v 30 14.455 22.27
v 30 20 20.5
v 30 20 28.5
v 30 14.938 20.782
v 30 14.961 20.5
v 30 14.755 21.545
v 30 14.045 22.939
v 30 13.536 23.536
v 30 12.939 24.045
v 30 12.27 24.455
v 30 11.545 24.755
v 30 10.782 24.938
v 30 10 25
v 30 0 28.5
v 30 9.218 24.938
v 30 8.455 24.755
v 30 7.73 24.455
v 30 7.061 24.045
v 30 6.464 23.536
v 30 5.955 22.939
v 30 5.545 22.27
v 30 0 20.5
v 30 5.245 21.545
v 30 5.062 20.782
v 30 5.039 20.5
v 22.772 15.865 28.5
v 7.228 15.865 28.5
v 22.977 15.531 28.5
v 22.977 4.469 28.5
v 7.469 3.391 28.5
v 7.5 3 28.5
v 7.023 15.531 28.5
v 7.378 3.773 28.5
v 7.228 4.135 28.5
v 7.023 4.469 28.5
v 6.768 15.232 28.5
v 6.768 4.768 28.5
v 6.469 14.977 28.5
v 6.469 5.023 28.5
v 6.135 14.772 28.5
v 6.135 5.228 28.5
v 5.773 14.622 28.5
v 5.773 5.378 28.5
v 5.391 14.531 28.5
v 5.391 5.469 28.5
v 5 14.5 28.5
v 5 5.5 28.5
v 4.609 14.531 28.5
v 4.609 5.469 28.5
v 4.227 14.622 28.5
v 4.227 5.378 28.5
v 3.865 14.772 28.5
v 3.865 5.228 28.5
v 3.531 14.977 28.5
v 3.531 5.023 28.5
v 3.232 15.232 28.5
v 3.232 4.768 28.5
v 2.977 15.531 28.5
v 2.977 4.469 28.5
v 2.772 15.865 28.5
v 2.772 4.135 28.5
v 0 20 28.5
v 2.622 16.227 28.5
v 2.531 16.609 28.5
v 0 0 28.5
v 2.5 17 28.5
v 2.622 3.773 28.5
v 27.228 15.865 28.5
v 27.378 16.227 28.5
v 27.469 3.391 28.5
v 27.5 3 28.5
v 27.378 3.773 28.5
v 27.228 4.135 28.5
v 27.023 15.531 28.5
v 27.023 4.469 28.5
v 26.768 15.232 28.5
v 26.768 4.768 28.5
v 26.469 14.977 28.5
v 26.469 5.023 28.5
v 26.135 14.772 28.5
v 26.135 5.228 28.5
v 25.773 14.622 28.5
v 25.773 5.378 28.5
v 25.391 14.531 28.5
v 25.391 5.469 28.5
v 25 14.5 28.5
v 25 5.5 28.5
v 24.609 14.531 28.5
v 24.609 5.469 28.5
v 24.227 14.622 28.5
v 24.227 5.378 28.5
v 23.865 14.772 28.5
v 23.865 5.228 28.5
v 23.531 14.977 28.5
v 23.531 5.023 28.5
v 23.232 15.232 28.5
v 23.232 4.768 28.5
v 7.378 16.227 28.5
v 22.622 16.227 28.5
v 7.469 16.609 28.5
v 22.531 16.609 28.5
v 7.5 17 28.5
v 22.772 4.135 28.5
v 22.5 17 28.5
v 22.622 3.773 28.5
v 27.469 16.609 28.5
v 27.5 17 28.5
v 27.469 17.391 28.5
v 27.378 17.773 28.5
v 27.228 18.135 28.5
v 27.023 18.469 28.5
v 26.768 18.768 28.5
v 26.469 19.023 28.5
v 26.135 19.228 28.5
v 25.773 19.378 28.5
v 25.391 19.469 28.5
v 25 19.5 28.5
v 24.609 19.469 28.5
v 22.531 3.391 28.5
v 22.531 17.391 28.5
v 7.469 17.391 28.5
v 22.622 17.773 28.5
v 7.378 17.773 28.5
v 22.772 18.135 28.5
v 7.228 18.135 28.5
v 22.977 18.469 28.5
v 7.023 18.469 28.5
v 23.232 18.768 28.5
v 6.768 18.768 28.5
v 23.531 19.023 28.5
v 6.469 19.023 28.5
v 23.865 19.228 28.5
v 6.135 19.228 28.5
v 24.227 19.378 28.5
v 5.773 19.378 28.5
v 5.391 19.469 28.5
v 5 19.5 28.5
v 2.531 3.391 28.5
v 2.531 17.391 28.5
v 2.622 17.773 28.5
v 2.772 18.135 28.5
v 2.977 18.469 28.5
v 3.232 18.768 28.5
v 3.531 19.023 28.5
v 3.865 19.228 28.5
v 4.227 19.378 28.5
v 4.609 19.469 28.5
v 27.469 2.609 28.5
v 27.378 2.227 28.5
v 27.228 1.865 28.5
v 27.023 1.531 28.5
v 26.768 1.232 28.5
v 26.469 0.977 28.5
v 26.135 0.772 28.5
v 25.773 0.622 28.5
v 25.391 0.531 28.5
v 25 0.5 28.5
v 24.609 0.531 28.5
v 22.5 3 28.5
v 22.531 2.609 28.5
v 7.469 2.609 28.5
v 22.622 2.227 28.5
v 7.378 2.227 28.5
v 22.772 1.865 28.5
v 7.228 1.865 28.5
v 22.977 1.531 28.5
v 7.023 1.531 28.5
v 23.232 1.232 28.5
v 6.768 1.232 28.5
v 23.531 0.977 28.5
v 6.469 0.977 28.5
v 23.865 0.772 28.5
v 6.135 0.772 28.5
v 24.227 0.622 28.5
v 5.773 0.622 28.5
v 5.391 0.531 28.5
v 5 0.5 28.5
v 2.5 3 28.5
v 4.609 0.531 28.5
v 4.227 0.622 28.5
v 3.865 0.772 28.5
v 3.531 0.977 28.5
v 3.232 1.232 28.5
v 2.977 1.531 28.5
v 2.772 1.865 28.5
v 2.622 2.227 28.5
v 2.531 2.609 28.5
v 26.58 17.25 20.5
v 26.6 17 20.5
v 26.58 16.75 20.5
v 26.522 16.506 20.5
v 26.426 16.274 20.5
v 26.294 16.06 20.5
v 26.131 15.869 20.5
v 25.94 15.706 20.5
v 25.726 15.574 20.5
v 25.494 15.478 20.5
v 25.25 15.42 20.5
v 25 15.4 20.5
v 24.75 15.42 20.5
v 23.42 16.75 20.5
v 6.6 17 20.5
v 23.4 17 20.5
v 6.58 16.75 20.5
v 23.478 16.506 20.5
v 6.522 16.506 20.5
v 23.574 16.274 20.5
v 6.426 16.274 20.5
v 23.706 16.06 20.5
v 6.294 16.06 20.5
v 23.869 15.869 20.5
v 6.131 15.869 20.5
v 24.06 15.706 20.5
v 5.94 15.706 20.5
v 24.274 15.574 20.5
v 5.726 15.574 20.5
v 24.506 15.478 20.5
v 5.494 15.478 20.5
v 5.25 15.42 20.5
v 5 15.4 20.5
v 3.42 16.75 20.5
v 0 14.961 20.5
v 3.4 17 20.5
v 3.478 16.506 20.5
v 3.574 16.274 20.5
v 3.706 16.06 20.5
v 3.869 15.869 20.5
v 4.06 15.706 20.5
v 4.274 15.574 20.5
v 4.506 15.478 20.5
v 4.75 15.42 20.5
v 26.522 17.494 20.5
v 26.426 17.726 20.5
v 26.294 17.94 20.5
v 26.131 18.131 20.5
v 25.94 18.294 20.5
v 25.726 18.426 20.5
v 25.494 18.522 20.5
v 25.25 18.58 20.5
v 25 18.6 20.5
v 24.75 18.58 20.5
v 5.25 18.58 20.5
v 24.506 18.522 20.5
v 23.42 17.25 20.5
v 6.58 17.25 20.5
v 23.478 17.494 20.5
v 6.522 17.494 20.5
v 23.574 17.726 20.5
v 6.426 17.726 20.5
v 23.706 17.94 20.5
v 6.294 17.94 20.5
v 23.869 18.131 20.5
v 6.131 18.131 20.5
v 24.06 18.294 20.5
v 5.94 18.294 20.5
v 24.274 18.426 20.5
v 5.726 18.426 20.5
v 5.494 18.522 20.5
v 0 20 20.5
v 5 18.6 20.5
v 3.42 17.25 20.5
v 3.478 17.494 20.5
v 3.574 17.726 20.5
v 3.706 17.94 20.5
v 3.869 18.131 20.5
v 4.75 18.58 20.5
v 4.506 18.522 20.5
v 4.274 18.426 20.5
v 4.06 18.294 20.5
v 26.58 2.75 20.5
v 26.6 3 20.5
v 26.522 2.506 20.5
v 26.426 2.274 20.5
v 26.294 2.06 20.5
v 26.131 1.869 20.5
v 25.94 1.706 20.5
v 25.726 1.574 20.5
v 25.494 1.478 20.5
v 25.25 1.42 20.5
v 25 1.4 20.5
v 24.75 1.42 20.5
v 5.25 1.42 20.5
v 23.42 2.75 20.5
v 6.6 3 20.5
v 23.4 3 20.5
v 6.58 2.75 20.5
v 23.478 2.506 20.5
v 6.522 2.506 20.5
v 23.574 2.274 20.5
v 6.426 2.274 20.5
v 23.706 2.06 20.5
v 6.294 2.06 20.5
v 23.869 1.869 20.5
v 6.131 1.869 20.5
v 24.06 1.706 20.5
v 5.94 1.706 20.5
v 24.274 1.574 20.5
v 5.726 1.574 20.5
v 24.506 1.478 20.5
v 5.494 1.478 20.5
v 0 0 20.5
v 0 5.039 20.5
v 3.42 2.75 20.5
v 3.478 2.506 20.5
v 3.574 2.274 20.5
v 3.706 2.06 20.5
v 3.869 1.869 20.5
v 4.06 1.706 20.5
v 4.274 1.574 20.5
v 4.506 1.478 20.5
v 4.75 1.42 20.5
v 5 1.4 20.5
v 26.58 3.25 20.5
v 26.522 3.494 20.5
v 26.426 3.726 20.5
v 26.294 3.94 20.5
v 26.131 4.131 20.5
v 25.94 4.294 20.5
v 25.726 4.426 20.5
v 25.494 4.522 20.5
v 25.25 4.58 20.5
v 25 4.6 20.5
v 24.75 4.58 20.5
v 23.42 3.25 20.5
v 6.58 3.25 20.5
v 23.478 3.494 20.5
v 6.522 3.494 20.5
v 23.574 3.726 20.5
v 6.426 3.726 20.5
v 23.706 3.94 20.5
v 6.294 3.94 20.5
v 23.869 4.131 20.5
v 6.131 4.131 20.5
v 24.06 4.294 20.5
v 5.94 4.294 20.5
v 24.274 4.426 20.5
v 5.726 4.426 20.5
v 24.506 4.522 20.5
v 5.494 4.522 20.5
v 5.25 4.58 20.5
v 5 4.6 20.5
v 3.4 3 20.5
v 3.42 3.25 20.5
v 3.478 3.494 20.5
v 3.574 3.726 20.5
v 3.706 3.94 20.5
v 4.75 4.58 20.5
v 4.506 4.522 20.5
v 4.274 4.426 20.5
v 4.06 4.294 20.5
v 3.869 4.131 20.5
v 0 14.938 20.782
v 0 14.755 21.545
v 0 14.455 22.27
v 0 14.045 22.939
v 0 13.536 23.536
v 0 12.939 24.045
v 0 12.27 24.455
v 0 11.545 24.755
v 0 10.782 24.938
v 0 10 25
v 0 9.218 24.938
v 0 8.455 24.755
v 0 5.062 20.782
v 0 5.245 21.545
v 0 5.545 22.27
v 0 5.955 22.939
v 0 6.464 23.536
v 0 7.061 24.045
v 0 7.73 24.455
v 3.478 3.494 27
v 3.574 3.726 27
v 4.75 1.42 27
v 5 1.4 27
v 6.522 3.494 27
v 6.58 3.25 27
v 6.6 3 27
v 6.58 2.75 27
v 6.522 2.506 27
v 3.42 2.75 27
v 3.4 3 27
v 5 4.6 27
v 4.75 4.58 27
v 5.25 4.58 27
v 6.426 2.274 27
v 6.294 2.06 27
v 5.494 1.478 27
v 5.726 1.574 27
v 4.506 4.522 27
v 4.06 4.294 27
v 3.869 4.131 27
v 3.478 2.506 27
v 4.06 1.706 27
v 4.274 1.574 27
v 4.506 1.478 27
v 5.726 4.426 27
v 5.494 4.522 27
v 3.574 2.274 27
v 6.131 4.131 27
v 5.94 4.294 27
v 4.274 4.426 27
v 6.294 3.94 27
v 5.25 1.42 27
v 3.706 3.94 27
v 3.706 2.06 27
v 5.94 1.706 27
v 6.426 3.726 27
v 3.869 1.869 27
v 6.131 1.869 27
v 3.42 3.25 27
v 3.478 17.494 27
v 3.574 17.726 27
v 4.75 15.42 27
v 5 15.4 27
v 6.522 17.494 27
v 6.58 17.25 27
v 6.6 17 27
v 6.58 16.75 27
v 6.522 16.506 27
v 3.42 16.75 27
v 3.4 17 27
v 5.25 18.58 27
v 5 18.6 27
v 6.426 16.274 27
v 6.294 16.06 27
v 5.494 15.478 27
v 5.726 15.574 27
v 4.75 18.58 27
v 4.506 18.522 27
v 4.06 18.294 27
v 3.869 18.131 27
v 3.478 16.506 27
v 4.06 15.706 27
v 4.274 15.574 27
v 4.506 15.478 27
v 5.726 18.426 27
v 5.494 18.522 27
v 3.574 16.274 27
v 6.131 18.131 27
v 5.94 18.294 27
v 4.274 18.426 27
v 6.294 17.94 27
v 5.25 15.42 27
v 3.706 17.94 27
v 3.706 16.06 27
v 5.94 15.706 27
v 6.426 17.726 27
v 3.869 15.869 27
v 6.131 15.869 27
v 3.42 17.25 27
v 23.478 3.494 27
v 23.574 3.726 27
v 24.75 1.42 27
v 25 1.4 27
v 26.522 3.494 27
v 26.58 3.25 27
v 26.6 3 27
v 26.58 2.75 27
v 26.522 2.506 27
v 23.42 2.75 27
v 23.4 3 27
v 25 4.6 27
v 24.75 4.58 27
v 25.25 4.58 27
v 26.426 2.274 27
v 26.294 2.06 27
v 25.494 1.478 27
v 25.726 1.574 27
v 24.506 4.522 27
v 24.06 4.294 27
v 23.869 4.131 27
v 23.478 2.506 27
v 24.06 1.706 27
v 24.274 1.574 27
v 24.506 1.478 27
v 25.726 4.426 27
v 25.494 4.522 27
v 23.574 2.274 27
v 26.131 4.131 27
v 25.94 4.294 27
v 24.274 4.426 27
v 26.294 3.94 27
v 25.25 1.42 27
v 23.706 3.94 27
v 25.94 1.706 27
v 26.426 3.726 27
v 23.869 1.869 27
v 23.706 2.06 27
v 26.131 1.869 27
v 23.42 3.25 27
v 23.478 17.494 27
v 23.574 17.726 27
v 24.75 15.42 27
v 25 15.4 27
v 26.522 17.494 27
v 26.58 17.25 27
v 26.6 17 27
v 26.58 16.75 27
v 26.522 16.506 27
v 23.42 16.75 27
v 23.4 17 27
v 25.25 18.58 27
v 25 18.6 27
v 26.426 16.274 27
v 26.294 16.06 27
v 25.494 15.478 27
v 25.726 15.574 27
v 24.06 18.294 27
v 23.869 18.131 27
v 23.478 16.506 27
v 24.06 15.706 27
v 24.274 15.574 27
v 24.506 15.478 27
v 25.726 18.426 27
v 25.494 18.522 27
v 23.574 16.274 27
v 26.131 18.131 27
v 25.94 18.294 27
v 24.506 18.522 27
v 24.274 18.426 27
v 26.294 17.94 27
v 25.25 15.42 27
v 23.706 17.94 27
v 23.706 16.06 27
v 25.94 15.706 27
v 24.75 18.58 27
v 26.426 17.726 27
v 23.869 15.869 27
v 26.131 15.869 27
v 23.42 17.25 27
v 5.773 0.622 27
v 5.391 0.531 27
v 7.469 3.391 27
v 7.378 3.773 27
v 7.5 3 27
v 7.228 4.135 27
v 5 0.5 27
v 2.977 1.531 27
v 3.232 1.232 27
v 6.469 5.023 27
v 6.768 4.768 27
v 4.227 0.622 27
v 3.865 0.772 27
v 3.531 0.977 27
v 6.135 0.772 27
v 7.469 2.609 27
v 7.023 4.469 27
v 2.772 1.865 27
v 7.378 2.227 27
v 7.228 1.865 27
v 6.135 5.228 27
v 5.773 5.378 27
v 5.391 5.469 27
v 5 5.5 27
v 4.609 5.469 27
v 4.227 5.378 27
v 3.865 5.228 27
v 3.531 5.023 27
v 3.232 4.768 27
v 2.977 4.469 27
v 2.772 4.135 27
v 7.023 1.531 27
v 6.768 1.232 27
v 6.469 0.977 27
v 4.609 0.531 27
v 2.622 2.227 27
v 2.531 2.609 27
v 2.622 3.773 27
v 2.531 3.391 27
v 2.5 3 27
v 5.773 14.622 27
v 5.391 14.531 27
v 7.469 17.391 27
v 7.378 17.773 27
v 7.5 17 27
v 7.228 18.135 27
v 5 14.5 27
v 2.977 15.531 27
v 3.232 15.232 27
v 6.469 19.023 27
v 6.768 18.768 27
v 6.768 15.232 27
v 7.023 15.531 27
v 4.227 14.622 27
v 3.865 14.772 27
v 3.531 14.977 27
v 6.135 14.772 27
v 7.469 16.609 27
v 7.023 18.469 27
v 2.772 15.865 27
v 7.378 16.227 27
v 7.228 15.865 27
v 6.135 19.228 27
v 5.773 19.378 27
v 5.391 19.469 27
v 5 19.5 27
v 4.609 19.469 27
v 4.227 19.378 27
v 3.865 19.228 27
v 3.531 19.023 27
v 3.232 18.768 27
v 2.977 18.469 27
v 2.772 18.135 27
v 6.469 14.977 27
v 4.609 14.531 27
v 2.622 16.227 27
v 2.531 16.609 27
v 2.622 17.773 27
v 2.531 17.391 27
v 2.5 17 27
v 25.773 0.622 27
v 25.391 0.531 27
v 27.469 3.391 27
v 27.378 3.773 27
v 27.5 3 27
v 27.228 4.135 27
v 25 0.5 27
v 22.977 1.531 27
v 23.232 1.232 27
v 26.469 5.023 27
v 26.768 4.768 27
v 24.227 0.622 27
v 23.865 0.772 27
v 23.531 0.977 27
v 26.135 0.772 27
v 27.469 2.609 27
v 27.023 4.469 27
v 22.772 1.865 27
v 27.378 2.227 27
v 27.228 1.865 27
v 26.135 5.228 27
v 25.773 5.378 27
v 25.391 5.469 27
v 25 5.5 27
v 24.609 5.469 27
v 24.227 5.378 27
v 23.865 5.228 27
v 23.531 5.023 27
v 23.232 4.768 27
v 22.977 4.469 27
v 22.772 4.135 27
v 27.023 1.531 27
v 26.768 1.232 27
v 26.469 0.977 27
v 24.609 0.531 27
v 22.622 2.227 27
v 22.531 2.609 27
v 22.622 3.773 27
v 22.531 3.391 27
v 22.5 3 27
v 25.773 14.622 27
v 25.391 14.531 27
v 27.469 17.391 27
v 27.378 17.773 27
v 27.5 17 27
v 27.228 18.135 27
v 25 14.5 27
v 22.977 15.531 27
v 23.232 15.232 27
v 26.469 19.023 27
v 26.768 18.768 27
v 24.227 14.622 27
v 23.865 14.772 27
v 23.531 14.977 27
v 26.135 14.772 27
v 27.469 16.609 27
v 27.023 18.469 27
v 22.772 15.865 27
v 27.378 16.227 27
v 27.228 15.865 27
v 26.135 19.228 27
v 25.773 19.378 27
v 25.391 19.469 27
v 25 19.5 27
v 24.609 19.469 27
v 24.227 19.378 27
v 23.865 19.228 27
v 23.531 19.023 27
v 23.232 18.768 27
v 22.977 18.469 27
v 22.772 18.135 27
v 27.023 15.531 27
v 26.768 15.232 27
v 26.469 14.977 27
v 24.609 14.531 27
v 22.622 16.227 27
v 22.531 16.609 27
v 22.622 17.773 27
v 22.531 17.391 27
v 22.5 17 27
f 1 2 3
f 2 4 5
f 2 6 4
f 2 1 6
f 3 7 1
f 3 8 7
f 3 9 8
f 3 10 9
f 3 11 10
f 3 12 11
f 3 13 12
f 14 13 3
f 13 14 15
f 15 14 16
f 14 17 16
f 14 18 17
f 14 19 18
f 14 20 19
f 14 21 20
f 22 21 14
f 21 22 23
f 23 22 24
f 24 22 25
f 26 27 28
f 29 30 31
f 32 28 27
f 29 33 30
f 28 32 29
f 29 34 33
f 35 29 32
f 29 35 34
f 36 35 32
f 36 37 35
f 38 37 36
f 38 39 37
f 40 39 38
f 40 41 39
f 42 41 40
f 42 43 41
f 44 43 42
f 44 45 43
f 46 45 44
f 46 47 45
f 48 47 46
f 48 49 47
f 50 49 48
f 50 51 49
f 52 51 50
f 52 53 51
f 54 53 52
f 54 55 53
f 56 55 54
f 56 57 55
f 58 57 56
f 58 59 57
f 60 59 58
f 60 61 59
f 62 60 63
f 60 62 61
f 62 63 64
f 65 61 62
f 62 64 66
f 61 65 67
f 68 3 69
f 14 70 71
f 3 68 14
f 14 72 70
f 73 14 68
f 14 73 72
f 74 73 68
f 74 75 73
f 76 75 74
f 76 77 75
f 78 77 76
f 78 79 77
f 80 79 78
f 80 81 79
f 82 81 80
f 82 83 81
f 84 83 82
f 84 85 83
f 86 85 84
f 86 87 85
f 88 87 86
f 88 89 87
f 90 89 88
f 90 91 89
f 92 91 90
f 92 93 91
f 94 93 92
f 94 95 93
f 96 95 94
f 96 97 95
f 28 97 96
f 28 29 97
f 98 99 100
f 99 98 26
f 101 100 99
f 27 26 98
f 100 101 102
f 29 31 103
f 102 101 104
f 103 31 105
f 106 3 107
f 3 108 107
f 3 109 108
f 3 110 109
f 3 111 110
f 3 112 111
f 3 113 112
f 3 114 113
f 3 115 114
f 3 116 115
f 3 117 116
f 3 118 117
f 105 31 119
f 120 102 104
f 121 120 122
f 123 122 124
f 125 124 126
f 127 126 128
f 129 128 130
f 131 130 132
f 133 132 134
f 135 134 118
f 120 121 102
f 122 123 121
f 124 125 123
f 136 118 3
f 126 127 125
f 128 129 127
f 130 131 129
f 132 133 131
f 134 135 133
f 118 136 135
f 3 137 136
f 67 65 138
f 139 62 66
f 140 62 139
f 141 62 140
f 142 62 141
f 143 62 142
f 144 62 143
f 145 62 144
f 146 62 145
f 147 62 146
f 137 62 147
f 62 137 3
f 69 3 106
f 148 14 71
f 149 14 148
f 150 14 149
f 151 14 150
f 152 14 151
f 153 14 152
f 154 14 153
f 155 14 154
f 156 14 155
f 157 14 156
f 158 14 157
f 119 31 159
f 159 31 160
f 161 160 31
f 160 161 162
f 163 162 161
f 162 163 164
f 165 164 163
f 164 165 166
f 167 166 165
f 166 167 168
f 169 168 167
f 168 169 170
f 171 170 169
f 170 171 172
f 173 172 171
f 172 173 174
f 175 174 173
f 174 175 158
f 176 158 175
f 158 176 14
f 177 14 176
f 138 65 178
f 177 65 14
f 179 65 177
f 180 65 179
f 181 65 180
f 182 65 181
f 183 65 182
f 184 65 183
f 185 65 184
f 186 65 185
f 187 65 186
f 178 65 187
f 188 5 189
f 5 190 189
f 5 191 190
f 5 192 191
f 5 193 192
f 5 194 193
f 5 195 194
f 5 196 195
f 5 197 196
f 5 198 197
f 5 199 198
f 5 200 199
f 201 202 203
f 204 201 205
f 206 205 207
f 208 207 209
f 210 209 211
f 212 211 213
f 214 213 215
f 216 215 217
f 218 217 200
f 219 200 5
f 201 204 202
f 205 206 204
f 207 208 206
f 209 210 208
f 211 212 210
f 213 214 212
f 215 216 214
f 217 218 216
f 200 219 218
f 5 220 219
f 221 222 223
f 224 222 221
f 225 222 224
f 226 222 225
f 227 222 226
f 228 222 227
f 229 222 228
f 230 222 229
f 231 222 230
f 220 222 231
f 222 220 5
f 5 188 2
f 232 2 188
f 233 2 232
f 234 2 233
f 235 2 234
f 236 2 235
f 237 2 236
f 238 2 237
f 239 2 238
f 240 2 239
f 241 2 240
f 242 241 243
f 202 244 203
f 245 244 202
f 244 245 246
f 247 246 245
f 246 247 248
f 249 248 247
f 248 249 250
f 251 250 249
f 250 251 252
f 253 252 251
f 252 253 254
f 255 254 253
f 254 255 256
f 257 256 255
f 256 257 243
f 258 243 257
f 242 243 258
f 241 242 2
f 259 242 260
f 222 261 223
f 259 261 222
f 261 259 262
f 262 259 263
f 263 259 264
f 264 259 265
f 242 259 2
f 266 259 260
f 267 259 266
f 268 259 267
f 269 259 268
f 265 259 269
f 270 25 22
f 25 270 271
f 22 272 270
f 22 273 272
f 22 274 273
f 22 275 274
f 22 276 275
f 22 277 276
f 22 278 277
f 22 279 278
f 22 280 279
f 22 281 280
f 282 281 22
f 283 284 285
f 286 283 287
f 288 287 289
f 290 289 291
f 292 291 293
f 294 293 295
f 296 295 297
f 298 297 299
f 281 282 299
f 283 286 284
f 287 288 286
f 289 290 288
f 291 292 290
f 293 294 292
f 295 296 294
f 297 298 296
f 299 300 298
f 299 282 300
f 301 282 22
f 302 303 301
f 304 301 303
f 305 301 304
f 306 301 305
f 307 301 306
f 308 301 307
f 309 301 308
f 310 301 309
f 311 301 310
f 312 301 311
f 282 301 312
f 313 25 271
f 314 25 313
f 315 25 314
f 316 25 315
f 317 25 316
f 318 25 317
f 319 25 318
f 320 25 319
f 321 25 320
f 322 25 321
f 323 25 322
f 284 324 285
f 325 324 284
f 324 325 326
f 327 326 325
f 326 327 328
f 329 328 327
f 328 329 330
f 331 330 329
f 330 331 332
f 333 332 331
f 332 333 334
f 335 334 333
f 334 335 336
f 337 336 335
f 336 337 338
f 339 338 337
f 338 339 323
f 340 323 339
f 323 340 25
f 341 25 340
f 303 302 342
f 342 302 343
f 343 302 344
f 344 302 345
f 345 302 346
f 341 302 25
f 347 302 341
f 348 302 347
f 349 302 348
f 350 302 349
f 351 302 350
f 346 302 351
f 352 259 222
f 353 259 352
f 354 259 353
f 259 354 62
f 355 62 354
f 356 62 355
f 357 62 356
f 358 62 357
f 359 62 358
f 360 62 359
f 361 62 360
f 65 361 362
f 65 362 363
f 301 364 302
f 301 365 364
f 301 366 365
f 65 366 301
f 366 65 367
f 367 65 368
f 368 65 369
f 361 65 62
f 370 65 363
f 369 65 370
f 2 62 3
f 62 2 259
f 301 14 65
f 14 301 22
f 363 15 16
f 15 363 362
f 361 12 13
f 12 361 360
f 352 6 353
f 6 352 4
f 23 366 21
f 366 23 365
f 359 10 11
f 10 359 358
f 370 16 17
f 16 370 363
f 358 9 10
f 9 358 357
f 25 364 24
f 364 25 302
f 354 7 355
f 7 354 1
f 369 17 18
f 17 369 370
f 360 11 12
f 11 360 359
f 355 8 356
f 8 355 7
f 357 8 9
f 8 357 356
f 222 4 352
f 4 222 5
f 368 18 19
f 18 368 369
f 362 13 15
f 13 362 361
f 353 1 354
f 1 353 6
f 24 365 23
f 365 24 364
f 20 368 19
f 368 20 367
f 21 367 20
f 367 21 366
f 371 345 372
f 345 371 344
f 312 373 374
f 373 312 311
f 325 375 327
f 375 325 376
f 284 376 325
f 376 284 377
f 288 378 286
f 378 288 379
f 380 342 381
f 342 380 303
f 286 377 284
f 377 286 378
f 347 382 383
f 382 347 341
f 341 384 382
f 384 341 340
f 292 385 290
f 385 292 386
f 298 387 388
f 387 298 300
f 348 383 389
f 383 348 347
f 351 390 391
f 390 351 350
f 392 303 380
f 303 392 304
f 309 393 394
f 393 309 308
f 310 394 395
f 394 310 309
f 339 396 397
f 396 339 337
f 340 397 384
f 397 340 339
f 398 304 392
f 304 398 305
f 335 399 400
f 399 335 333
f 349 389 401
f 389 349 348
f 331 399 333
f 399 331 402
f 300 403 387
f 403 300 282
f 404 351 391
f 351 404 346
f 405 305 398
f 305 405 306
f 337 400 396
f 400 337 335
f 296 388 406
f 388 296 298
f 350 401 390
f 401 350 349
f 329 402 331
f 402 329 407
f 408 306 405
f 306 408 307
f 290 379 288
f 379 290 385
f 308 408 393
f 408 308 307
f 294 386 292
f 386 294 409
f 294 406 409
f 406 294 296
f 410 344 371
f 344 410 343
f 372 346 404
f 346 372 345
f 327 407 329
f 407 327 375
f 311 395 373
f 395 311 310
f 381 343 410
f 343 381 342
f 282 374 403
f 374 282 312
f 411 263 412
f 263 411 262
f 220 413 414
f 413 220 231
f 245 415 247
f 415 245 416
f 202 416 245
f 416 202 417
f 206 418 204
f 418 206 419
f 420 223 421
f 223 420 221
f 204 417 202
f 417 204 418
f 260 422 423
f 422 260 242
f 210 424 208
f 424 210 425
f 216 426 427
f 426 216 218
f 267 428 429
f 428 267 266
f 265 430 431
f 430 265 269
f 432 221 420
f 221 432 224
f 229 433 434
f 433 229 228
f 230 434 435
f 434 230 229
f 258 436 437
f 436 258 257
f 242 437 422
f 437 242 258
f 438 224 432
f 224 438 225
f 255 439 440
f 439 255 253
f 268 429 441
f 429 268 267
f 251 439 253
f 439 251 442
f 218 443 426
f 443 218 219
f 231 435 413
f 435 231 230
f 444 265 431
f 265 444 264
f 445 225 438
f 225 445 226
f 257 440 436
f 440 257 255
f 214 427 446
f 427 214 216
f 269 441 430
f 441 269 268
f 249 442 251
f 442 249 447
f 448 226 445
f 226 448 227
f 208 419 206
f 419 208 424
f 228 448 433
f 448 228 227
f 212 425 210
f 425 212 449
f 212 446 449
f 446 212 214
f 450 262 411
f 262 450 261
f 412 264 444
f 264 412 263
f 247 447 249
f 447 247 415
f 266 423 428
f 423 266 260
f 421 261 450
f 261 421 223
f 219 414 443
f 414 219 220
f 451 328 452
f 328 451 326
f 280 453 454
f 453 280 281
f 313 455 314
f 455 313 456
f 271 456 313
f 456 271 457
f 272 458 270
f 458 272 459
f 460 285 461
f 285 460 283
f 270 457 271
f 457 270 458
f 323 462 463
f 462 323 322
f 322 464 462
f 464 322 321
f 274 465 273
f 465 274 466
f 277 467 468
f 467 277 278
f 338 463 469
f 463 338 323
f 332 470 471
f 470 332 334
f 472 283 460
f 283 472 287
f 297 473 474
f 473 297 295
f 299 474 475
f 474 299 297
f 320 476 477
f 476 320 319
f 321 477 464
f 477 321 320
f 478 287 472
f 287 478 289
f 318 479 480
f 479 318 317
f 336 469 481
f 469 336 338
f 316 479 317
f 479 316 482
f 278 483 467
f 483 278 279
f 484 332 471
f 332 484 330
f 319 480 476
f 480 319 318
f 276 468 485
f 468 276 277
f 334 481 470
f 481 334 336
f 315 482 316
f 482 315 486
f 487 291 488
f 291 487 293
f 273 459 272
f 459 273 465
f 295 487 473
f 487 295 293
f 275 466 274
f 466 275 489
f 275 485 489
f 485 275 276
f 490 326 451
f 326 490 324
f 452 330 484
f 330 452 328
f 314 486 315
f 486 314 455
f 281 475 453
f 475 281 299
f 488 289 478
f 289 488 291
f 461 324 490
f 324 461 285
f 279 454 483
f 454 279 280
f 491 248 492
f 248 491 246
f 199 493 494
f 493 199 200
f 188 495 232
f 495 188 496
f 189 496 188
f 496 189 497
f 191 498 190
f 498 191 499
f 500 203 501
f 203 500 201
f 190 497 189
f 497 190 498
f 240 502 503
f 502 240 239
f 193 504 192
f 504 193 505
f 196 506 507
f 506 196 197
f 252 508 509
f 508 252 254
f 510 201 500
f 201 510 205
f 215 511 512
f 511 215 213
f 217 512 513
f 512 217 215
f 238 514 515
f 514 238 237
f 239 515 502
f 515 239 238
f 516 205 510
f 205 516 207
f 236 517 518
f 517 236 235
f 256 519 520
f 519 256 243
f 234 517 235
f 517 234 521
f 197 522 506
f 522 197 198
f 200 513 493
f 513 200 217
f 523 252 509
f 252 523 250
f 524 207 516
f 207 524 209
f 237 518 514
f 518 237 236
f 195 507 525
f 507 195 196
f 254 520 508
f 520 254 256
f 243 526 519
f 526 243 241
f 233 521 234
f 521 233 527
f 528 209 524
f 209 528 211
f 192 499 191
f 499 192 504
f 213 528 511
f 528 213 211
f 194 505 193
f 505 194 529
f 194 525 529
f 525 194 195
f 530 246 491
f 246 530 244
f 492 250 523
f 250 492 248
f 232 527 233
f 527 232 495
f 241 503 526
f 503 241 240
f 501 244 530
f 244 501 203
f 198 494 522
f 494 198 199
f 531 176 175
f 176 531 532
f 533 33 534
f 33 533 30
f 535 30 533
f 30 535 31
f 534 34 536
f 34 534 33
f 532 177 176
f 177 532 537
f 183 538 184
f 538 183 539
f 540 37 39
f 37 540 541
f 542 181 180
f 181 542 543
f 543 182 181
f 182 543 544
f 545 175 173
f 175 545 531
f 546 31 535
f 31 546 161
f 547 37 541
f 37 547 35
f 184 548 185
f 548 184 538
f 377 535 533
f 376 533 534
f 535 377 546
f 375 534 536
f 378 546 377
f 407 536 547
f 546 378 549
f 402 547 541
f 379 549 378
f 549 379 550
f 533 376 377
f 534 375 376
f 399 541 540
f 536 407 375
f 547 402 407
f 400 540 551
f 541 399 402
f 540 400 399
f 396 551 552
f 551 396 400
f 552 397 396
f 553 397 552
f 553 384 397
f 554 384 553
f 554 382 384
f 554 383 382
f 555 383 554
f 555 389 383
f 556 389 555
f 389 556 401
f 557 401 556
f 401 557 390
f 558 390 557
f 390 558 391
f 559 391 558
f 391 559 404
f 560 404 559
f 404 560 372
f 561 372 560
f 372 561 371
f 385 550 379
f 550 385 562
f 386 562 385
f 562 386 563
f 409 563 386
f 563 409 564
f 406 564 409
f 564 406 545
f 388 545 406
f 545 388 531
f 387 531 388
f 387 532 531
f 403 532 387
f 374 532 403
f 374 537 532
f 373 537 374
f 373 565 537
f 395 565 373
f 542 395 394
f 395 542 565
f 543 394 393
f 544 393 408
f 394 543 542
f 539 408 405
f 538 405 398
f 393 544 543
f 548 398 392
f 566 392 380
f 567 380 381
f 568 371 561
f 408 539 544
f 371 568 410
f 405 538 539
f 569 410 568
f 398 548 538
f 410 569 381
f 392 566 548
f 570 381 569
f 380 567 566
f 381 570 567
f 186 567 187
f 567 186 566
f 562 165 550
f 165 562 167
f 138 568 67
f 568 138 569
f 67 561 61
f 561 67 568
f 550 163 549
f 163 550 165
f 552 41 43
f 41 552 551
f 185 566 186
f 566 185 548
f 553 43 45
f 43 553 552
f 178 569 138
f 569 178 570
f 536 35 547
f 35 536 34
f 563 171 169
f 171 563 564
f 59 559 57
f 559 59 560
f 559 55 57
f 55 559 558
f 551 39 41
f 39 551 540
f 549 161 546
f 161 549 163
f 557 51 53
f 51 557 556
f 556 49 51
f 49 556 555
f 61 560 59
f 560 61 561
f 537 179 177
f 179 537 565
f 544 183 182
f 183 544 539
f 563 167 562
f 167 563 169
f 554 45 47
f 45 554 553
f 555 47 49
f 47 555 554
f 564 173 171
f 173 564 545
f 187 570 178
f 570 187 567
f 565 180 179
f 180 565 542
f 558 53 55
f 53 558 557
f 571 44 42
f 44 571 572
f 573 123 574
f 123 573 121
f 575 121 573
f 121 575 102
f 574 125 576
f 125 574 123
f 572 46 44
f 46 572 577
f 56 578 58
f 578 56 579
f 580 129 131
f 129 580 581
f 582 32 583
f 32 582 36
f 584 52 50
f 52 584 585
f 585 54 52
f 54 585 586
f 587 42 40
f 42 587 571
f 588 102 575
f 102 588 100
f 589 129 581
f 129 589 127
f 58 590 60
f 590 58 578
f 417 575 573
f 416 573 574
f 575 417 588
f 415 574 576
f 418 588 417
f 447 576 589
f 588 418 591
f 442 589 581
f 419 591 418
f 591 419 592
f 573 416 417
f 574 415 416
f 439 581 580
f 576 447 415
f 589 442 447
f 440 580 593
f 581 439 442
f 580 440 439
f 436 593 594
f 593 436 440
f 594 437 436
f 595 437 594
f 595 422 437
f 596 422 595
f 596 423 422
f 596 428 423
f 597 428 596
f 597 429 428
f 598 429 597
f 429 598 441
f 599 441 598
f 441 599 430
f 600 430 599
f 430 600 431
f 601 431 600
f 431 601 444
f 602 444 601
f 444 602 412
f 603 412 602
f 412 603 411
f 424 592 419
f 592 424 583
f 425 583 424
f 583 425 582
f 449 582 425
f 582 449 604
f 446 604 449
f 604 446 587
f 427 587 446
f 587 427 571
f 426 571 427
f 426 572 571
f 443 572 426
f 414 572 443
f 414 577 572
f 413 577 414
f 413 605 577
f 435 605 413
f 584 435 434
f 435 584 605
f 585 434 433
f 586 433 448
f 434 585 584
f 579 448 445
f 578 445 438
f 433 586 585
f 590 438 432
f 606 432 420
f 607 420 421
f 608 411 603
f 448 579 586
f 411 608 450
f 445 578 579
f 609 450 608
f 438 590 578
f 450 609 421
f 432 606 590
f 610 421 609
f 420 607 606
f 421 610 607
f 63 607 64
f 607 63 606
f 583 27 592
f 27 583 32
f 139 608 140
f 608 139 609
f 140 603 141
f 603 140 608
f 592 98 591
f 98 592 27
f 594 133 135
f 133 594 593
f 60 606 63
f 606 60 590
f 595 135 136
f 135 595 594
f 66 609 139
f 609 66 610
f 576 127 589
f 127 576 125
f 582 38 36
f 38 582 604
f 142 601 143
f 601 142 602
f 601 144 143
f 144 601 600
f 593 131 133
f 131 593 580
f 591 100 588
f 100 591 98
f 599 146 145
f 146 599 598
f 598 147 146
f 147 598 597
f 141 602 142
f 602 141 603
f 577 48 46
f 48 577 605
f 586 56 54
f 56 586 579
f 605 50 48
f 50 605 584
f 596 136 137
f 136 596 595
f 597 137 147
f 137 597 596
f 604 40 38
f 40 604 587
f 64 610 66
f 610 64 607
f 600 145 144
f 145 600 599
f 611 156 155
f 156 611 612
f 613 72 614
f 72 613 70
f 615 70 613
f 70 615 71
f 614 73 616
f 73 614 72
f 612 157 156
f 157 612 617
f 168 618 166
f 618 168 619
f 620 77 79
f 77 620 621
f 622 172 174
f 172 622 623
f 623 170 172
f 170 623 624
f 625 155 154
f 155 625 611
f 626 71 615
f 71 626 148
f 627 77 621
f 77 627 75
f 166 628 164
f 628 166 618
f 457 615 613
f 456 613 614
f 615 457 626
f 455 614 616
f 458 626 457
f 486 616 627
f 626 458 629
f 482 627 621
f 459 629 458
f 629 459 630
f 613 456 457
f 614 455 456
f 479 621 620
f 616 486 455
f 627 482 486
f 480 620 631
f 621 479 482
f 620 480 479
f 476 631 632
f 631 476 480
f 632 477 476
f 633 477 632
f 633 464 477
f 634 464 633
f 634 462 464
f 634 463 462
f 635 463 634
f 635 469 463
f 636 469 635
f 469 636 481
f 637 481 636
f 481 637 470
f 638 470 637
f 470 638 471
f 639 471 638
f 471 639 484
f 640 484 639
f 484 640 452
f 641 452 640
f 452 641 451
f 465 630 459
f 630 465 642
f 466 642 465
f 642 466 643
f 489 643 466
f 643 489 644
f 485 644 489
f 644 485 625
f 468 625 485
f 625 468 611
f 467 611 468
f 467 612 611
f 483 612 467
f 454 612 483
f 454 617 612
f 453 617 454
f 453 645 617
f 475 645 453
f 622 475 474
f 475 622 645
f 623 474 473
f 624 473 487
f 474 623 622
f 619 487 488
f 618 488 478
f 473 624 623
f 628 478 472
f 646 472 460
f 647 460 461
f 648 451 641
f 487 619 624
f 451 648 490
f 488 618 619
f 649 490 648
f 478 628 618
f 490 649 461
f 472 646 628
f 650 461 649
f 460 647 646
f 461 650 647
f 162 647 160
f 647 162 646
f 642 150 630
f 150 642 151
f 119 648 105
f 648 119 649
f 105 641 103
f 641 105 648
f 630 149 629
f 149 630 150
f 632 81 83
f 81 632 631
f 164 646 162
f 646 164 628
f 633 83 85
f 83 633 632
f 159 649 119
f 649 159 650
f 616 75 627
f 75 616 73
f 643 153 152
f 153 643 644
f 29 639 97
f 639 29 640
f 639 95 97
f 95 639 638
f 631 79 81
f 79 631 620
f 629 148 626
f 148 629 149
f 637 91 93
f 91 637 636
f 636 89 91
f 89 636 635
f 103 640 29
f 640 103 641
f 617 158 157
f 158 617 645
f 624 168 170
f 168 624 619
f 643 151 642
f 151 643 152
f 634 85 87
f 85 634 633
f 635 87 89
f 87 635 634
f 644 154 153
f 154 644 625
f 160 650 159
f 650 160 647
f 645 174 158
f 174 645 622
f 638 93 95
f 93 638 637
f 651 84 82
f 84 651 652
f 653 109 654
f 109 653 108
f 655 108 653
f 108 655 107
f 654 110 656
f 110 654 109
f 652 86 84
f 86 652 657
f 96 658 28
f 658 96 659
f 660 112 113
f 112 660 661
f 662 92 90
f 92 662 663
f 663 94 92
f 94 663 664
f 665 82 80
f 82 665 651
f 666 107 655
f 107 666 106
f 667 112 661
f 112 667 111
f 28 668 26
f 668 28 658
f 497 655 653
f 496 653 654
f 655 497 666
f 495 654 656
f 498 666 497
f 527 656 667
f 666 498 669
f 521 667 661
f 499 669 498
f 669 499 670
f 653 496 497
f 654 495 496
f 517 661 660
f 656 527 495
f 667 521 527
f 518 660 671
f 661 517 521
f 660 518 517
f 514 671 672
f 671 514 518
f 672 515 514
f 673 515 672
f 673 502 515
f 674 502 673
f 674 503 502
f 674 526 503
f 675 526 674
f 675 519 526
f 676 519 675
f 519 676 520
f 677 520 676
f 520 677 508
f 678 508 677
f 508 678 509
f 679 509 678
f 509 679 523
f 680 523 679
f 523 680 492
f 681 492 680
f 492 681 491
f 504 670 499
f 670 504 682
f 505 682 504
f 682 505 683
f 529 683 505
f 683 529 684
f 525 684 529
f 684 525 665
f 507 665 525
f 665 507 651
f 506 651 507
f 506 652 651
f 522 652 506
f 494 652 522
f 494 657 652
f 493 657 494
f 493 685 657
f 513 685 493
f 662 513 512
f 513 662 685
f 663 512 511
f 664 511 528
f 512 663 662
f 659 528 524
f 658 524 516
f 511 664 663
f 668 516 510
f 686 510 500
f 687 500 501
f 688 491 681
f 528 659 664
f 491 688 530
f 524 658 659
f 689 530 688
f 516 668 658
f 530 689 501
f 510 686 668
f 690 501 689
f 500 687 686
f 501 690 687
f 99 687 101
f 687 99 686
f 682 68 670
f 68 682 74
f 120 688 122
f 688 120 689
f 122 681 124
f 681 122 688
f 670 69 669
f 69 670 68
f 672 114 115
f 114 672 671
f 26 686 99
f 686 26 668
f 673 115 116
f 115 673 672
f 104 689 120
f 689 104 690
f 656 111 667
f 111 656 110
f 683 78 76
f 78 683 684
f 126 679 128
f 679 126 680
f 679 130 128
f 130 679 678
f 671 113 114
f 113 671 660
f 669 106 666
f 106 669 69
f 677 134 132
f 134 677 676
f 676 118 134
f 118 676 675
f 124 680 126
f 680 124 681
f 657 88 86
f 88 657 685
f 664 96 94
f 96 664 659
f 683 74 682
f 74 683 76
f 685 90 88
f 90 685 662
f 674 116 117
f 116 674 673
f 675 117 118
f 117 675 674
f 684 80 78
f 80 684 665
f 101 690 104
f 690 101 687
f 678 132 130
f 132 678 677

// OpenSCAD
$fn = 40;
//bottom();
top();
module top(){
difference(){
    translate([0,0,20.5])cube([30,20,8]);
    translate([0,10,20])rotate([0,90,0])cylinder(d=10,h=30);
        translate([5,3,20])cylinder(d=3.2,h=20);
    translate([5,20-3,20])cylinder(d=3.2,h=20);
    
        translate([30-5,3,20])cylinder(d=3.2,h=20);
    translate([30-5,20-3,20])cylinder(d=3.2,h=20);
    
            translate([5,3,27])cylinder(d=5,h=20);
    translate([5,20-3,27])cylinder(d=5,h=20);
    
        translate([30-5,3,27])cylinder(d=5,h=20);
    translate([30-5,20-3,27])cylinder(d=5,h=20);
} 
}
module bottom(){
difference(){
    cube([30,20,19.5]);
    translate([0,10,20])rotate([0,90,0])cylinder(d=10,h=30);
    
    translate([7,10,0])cylinder(d=4,h=30);
    translate([7,10,10])cylinder(d=8,h=30);
    
    translate([30-7,10,0])cylinder(d=4,h=30);
    translate([30-7,10,10])cylinder(d=8,h=30);
    
    translate([5,3,10])cylinder(d=2.6,h=20);
    translate([5,20-3,10])cylinder(d=2.6,h=20);
    
        translate([30-5,3,10])cylinder(d=2.6,h=20);
    translate([30-5,20-3,10])cylinder(d=2.6,h=20);
}}
